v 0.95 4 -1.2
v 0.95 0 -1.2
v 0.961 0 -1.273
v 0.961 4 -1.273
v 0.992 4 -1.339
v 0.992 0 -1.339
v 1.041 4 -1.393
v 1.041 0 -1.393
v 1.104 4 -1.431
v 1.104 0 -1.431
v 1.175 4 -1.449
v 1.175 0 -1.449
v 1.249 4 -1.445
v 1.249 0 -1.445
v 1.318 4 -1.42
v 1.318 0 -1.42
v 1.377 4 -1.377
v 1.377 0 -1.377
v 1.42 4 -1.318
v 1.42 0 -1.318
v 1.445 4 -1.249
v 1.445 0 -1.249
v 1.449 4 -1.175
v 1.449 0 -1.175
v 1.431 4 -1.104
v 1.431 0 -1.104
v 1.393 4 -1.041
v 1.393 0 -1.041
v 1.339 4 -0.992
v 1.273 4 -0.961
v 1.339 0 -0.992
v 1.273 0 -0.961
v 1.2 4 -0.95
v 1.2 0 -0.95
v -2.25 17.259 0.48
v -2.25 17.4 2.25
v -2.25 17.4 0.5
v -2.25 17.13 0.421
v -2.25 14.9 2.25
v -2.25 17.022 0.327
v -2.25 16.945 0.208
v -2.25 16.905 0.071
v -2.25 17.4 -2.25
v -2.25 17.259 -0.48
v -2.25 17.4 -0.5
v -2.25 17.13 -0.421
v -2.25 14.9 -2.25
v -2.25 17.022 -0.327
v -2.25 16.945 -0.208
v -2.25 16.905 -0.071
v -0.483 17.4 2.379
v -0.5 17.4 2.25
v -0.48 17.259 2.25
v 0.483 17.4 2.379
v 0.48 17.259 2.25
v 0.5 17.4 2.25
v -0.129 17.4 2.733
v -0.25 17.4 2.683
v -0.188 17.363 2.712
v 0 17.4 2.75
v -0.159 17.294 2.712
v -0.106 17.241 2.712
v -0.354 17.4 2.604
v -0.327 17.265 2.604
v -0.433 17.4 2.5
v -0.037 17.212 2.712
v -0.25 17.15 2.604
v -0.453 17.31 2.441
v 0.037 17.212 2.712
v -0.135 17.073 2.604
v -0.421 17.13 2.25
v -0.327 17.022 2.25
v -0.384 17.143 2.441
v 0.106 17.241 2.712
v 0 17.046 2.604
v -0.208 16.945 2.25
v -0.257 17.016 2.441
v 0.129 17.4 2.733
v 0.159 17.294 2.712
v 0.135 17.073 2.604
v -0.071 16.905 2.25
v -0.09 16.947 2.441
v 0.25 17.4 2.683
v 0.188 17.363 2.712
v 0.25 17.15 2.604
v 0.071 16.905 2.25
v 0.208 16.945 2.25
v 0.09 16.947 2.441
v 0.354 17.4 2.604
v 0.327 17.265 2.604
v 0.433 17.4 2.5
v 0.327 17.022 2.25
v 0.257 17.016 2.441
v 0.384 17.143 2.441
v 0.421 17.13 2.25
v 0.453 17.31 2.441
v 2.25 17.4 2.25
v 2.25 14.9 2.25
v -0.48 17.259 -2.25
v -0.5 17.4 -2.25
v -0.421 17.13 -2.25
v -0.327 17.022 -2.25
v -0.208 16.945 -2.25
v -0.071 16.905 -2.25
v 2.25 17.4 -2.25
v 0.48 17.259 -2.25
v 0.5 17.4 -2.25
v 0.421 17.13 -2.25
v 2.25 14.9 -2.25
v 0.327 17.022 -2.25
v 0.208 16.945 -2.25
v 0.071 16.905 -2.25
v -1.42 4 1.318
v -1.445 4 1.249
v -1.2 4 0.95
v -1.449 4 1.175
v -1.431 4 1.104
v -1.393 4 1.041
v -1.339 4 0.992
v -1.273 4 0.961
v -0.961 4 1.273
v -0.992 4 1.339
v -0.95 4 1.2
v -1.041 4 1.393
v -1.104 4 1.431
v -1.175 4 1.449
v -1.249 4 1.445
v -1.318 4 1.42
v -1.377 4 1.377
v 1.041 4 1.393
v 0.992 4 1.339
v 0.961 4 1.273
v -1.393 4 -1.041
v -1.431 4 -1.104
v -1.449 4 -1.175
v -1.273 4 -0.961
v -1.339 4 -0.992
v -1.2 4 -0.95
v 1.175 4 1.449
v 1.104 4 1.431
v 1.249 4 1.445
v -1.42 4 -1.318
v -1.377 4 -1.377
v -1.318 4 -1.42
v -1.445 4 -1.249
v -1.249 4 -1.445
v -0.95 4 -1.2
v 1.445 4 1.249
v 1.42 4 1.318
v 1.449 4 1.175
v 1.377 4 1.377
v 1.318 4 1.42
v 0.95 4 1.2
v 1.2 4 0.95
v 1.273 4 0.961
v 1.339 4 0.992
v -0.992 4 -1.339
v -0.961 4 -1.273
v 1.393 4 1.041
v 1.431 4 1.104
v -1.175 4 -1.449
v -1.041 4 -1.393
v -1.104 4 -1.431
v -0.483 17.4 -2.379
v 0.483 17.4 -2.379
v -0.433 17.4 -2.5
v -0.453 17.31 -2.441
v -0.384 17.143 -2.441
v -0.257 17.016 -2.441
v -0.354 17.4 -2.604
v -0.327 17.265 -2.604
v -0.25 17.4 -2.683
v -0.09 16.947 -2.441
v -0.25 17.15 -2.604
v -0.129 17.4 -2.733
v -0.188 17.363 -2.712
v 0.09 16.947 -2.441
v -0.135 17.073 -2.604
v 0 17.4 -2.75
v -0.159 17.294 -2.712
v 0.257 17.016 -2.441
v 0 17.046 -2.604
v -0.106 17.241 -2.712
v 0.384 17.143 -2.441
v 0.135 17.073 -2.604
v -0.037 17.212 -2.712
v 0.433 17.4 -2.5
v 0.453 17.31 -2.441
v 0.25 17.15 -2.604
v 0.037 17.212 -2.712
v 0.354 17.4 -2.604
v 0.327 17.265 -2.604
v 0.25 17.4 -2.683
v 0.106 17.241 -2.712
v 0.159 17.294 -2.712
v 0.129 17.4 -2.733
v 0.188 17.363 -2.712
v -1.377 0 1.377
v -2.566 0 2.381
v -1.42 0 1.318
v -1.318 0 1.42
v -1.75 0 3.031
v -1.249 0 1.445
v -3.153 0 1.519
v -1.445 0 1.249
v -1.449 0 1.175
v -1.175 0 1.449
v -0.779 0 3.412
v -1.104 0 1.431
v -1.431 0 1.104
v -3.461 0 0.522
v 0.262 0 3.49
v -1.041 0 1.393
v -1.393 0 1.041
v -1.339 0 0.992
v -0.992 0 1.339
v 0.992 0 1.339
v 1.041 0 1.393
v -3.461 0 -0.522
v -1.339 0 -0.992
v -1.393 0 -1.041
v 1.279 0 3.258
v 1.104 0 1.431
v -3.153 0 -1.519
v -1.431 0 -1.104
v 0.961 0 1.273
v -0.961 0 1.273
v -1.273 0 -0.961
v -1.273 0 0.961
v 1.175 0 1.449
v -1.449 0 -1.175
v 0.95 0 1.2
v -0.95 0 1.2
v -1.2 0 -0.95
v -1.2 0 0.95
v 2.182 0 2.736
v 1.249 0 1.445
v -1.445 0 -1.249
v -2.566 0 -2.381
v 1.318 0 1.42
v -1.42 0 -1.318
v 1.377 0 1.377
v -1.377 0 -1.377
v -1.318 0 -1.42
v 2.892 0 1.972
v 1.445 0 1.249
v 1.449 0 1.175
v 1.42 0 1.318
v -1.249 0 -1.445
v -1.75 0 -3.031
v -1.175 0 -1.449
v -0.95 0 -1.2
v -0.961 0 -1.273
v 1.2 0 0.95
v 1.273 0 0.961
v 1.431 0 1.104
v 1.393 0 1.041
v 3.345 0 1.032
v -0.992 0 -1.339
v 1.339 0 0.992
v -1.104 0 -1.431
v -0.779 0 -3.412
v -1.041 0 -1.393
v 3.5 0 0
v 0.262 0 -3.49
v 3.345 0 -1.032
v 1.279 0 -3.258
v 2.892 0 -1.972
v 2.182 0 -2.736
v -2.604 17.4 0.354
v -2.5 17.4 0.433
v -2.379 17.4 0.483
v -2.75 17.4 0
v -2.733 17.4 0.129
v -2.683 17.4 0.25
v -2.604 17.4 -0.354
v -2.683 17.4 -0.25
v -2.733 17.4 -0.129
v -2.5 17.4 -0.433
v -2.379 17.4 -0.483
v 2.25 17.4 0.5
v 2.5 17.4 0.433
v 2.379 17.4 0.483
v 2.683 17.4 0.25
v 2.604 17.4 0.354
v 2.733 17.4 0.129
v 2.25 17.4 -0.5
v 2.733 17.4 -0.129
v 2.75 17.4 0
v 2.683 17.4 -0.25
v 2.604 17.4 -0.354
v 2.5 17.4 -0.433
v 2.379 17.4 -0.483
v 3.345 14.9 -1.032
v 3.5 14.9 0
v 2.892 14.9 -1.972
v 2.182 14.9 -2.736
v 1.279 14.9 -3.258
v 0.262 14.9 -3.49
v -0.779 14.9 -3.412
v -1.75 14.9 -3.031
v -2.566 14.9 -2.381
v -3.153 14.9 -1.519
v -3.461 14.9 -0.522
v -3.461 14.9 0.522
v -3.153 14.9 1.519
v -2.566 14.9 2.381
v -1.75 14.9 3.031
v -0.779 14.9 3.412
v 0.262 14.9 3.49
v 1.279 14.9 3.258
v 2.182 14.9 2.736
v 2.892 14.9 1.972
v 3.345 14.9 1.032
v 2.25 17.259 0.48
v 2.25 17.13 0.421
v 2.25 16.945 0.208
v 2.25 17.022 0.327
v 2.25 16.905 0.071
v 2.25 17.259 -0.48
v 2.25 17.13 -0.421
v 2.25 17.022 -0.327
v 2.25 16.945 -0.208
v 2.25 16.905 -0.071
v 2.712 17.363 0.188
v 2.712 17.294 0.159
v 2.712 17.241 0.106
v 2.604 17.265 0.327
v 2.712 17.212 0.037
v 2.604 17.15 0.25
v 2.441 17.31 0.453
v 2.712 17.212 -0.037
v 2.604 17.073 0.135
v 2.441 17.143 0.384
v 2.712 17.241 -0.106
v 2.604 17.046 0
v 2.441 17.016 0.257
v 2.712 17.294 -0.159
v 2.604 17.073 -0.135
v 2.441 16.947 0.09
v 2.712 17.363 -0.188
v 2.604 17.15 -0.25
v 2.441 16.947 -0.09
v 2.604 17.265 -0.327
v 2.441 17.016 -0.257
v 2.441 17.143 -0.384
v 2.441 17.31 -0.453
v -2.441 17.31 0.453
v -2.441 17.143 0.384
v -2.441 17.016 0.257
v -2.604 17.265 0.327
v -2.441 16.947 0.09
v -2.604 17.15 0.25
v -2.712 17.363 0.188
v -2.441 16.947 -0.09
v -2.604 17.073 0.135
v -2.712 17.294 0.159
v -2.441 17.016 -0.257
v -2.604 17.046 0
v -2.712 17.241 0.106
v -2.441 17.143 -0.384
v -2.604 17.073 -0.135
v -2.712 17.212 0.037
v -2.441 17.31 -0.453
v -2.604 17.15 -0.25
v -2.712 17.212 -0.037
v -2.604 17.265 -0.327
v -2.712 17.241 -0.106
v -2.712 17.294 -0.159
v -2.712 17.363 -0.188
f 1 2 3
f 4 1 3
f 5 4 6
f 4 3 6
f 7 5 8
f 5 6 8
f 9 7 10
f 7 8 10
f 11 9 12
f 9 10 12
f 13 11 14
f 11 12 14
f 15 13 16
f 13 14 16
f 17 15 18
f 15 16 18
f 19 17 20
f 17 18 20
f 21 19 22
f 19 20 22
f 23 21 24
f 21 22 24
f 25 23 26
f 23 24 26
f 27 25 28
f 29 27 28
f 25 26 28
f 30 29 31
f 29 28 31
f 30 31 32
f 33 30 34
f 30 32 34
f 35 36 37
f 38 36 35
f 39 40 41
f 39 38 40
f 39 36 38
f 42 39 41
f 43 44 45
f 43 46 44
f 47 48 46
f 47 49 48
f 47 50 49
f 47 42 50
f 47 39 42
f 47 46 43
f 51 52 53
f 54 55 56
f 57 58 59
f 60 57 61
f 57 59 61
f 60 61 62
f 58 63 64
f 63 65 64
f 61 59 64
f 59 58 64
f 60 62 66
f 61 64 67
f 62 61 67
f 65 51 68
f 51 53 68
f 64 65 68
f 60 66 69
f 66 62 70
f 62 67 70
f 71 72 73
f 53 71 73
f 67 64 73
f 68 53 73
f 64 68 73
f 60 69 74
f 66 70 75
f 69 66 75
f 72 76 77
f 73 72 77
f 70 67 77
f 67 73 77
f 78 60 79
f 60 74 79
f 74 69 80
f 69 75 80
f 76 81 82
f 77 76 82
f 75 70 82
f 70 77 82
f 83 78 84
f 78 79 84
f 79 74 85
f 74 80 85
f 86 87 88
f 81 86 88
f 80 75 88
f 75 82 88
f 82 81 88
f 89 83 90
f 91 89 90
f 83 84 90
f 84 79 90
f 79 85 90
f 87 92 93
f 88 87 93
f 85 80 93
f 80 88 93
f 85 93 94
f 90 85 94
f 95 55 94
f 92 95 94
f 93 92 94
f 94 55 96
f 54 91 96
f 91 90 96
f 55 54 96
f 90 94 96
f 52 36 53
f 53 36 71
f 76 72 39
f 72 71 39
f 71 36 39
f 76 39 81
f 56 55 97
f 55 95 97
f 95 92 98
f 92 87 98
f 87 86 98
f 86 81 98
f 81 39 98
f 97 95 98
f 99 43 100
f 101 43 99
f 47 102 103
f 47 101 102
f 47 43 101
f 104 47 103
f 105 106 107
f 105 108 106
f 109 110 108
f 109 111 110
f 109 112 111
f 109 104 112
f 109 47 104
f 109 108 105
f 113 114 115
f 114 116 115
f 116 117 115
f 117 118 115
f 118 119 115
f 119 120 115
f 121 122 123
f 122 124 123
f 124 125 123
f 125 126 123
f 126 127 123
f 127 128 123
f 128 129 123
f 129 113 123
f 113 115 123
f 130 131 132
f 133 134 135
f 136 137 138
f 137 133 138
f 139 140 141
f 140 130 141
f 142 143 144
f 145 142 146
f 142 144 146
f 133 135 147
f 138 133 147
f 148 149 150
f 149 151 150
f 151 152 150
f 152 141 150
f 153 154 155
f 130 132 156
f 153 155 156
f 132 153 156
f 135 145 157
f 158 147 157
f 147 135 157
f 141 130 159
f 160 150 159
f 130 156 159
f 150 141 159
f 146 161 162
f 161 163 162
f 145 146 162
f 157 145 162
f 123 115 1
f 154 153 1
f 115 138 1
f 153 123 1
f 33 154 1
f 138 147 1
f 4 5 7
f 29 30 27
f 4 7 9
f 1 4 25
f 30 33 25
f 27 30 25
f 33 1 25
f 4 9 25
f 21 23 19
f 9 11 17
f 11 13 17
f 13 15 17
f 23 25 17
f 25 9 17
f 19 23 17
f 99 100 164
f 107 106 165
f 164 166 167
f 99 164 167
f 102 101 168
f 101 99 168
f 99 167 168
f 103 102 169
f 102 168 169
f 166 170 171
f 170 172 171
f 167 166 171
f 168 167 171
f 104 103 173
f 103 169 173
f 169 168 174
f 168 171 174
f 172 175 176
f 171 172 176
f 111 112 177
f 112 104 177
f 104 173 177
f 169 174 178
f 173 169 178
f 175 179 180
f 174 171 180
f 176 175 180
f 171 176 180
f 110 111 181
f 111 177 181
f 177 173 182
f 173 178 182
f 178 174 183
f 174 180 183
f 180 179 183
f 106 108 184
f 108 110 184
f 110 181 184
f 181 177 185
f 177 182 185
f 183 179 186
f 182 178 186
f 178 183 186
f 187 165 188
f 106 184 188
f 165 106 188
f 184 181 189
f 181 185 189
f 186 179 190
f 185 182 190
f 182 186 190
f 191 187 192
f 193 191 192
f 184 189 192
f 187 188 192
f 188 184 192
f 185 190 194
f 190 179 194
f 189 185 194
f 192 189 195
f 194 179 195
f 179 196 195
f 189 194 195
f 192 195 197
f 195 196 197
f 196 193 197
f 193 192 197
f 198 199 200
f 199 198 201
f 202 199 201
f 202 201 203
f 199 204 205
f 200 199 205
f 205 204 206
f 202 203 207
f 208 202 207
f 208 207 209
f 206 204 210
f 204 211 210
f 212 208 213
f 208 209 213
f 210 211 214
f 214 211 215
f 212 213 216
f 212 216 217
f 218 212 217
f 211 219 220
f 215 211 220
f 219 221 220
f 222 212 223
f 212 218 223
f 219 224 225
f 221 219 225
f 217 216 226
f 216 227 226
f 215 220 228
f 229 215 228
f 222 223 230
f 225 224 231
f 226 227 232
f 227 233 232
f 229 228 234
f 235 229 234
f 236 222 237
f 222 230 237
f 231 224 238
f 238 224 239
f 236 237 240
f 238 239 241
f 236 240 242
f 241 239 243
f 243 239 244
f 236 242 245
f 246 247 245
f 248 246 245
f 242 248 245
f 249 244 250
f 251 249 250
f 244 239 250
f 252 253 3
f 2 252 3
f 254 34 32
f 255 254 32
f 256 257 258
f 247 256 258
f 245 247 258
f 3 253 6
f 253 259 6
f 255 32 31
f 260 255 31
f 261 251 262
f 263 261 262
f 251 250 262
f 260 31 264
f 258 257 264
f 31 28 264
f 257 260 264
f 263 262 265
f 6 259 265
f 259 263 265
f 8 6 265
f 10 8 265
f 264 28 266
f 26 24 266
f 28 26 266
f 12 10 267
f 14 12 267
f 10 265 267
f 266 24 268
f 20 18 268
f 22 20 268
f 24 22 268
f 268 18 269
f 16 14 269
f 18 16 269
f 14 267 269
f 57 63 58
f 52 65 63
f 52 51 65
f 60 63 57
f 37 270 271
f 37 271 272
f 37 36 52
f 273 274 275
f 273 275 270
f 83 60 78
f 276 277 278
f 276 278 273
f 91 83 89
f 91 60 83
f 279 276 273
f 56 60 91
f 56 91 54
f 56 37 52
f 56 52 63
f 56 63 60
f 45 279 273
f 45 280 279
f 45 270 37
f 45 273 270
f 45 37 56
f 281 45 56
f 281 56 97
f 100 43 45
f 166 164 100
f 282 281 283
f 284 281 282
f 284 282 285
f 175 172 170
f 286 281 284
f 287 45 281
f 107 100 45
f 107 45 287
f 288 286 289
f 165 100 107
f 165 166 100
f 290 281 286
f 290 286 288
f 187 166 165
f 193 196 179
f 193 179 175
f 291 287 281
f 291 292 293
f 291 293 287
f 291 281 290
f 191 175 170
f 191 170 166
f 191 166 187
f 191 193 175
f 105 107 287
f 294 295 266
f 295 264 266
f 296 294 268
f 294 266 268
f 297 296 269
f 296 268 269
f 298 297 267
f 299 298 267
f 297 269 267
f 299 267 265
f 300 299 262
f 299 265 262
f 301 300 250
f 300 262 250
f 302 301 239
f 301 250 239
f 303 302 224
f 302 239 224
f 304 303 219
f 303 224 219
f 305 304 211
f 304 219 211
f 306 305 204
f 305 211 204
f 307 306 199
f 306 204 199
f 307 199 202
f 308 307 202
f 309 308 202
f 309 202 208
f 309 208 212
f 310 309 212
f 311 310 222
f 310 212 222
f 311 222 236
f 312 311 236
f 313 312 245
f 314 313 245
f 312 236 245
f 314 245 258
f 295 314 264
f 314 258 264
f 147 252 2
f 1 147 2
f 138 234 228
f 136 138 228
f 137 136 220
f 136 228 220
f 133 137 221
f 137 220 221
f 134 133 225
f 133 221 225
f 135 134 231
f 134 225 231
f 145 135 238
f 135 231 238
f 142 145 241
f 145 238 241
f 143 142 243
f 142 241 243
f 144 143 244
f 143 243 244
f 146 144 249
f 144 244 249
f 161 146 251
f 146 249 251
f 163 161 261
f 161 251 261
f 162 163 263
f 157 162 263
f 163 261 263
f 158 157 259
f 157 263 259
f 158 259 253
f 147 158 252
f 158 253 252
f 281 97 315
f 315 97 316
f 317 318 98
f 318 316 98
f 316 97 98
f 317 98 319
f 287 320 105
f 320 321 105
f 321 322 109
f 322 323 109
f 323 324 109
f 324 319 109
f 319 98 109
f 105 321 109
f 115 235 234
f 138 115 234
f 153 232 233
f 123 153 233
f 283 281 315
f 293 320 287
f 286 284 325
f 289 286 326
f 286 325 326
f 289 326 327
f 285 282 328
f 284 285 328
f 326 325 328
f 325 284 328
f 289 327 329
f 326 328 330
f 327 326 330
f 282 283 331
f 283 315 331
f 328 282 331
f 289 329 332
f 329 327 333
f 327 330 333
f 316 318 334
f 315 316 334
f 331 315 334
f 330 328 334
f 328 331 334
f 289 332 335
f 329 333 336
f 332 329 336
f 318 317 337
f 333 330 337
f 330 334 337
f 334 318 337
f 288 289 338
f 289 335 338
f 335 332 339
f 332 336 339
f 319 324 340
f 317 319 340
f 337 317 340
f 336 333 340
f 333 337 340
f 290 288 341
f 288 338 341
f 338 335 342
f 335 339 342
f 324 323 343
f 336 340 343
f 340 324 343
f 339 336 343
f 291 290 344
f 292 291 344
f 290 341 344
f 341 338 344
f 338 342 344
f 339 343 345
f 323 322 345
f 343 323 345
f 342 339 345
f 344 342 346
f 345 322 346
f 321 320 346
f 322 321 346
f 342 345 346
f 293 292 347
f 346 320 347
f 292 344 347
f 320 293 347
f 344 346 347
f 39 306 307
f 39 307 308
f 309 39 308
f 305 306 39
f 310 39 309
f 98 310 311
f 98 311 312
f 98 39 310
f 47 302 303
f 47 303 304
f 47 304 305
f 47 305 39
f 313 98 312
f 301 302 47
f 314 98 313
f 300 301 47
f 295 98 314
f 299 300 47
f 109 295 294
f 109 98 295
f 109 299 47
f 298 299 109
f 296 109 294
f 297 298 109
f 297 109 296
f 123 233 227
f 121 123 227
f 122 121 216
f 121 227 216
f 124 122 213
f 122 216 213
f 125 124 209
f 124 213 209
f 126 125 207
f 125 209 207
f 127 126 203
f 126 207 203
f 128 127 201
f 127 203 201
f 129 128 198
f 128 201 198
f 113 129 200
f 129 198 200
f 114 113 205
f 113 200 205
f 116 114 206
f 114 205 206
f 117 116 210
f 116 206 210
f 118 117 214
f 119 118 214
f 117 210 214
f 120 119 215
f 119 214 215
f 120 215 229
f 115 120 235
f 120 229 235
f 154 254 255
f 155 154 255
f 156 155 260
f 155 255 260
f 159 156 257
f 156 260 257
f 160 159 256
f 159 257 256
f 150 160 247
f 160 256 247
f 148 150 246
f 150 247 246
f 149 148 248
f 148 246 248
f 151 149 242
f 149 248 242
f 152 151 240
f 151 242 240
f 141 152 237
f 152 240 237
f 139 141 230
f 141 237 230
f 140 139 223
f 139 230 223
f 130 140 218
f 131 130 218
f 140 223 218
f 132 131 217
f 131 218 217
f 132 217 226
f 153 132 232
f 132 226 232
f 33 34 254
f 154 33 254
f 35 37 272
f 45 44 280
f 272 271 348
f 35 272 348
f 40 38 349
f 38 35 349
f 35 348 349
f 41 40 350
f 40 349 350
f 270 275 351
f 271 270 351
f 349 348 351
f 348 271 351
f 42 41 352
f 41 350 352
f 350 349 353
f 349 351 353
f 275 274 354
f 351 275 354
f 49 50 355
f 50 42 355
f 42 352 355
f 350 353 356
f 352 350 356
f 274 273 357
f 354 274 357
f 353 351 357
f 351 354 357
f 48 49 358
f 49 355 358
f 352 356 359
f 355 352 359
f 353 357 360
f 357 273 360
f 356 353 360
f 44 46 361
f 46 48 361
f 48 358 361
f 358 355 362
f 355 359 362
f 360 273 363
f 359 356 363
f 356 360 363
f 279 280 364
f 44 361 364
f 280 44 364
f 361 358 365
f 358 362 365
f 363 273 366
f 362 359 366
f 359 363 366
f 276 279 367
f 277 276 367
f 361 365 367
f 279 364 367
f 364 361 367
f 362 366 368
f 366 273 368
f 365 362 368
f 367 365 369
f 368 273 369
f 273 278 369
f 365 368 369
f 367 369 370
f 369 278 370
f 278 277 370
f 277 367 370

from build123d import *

# Parameters (mm, degrees)
SKETCH_1_R          = 3.5
EXTRUDE_1_DEPTH     = 4
SKETCH_2_R          = 3.5
EXTRUDE_2_DEPTH     = 10.9
SKETCH_3_W          = 4.5
SKETCH_3_H          = 4.5
EXTRUDE_3_DEPTH     = 2.5
SKETCH_6_R          = 3.25
CUT_EXTRUDE_1_DEPTH = 2.5


with BuildPart() as part:
    # 草图1 → 凸台-拉伸1 (new body)
    with BuildSketch(Plane(origin=(0, 0, 0), x_dir=(1, 0, 0), z_dir=(0, 1, 0))):
        Circle(SKETCH_1_R)
        with BuildLine():
            Line((-0.95, 1.2), (0.95, 1.2))
            ThreePointArc((0.95, 1.2), (1.376776695, 1.376776695), (1.2, 0.95))
            Line((1.2, 0.95), (1.2, -0.95))
            ThreePointArc((1.2, -0.95), (1.376776695, -1.376776695), (0.95, -1.2))
            Line((0.95, -1.2), (-0.95, -1.2))
            ThreePointArc((-0.95, -1.2), (-1.376776695, -1.376776695), (-1.2, -0.95))
            Line((-1.2, -0.95), (-1.2, 0.95))
            ThreePointArc((-1.2, 0.95), (-1.376776695, 1.376776695), (-0.95, 1.2))
        make_face(mode=Mode.SUBTRACT)
    extrude(amount=EXTRUDE_1_DEPTH)

    # 草图2 → 凸台-拉伸2 (add)
    with BuildSketch(Plane(origin=(0, 4, 0), x_dir=(1, 0, 0), z_dir=(0, 1, 0))):
        Circle(SKETCH_2_R)
    extrude(amount=EXTRUDE_2_DEPTH)

    # 草图3 → 凸台-拉伸3 (add)
    with BuildSketch(Plane(origin=(0, 14.9, 0), x_dir=(1, 0, 0), z_dir=(0, 1, 0))):
        Rectangle(SKETCH_3_W, SKETCH_3_H)
    extrude(amount=EXTRUDE_3_DEPTH)

    # 草图4 → 旋转1 (revolve)
    with BuildSketch(Plane(origin=(0, 17.4, 0), x_dir=(1, 0, 0), z_dir=(0, 1, 0))):
        with BuildLine():
            Line((0, 2.75), (0, 1.75))
            ThreePointArc((0, 1.75), (-0.5, 2.25), (0, 2.75))
        make_face()
        with BuildLine():
            Line((0, -1.75), (0, -2.75))
            ThreePointArc((0, -2.75), (-0.5, -2.25), (0, -1.75))
        make_face()
    revolve(axis=Axis((0, 17.4, -2.75), (0, 0, 1)))

    # 草图5 → 旋转2 (revolve)
    with BuildSketch(Plane(origin=(0, 17.4, 0), x_dir=(1, 0, 0), z_dir=(0, 1, 0))):
        with BuildLine():
            Line((-2.75, 0), (-1.75, 0))
            ThreePointArc((-1.75, 0), (-2.25, 0.5), (-2.75, 0))
        make_face()
        with BuildLine():
            Line((1.75, 0), (2.75, 0))
            ThreePointArc((2.75, 0), (2.25, 0.5), (1.75, 0))
        make_face()
    revolve(axis=Axis((-2.75, 17.4, 0), (1, 0, 0)))

    # 草图6 → 切除-拉伸1 (cut)
    with BuildSketch(Plane(origin=(0, 17.4, 0), x_dir=(1, 0, 0), z_dir=(0, 1, 0))):
        Circle(SKETCH_6_R)
    extrude(amount=CUT_EXTRUDE_1_DEPTH, mode=Mode.SUBTRACT)


solid = part.part
